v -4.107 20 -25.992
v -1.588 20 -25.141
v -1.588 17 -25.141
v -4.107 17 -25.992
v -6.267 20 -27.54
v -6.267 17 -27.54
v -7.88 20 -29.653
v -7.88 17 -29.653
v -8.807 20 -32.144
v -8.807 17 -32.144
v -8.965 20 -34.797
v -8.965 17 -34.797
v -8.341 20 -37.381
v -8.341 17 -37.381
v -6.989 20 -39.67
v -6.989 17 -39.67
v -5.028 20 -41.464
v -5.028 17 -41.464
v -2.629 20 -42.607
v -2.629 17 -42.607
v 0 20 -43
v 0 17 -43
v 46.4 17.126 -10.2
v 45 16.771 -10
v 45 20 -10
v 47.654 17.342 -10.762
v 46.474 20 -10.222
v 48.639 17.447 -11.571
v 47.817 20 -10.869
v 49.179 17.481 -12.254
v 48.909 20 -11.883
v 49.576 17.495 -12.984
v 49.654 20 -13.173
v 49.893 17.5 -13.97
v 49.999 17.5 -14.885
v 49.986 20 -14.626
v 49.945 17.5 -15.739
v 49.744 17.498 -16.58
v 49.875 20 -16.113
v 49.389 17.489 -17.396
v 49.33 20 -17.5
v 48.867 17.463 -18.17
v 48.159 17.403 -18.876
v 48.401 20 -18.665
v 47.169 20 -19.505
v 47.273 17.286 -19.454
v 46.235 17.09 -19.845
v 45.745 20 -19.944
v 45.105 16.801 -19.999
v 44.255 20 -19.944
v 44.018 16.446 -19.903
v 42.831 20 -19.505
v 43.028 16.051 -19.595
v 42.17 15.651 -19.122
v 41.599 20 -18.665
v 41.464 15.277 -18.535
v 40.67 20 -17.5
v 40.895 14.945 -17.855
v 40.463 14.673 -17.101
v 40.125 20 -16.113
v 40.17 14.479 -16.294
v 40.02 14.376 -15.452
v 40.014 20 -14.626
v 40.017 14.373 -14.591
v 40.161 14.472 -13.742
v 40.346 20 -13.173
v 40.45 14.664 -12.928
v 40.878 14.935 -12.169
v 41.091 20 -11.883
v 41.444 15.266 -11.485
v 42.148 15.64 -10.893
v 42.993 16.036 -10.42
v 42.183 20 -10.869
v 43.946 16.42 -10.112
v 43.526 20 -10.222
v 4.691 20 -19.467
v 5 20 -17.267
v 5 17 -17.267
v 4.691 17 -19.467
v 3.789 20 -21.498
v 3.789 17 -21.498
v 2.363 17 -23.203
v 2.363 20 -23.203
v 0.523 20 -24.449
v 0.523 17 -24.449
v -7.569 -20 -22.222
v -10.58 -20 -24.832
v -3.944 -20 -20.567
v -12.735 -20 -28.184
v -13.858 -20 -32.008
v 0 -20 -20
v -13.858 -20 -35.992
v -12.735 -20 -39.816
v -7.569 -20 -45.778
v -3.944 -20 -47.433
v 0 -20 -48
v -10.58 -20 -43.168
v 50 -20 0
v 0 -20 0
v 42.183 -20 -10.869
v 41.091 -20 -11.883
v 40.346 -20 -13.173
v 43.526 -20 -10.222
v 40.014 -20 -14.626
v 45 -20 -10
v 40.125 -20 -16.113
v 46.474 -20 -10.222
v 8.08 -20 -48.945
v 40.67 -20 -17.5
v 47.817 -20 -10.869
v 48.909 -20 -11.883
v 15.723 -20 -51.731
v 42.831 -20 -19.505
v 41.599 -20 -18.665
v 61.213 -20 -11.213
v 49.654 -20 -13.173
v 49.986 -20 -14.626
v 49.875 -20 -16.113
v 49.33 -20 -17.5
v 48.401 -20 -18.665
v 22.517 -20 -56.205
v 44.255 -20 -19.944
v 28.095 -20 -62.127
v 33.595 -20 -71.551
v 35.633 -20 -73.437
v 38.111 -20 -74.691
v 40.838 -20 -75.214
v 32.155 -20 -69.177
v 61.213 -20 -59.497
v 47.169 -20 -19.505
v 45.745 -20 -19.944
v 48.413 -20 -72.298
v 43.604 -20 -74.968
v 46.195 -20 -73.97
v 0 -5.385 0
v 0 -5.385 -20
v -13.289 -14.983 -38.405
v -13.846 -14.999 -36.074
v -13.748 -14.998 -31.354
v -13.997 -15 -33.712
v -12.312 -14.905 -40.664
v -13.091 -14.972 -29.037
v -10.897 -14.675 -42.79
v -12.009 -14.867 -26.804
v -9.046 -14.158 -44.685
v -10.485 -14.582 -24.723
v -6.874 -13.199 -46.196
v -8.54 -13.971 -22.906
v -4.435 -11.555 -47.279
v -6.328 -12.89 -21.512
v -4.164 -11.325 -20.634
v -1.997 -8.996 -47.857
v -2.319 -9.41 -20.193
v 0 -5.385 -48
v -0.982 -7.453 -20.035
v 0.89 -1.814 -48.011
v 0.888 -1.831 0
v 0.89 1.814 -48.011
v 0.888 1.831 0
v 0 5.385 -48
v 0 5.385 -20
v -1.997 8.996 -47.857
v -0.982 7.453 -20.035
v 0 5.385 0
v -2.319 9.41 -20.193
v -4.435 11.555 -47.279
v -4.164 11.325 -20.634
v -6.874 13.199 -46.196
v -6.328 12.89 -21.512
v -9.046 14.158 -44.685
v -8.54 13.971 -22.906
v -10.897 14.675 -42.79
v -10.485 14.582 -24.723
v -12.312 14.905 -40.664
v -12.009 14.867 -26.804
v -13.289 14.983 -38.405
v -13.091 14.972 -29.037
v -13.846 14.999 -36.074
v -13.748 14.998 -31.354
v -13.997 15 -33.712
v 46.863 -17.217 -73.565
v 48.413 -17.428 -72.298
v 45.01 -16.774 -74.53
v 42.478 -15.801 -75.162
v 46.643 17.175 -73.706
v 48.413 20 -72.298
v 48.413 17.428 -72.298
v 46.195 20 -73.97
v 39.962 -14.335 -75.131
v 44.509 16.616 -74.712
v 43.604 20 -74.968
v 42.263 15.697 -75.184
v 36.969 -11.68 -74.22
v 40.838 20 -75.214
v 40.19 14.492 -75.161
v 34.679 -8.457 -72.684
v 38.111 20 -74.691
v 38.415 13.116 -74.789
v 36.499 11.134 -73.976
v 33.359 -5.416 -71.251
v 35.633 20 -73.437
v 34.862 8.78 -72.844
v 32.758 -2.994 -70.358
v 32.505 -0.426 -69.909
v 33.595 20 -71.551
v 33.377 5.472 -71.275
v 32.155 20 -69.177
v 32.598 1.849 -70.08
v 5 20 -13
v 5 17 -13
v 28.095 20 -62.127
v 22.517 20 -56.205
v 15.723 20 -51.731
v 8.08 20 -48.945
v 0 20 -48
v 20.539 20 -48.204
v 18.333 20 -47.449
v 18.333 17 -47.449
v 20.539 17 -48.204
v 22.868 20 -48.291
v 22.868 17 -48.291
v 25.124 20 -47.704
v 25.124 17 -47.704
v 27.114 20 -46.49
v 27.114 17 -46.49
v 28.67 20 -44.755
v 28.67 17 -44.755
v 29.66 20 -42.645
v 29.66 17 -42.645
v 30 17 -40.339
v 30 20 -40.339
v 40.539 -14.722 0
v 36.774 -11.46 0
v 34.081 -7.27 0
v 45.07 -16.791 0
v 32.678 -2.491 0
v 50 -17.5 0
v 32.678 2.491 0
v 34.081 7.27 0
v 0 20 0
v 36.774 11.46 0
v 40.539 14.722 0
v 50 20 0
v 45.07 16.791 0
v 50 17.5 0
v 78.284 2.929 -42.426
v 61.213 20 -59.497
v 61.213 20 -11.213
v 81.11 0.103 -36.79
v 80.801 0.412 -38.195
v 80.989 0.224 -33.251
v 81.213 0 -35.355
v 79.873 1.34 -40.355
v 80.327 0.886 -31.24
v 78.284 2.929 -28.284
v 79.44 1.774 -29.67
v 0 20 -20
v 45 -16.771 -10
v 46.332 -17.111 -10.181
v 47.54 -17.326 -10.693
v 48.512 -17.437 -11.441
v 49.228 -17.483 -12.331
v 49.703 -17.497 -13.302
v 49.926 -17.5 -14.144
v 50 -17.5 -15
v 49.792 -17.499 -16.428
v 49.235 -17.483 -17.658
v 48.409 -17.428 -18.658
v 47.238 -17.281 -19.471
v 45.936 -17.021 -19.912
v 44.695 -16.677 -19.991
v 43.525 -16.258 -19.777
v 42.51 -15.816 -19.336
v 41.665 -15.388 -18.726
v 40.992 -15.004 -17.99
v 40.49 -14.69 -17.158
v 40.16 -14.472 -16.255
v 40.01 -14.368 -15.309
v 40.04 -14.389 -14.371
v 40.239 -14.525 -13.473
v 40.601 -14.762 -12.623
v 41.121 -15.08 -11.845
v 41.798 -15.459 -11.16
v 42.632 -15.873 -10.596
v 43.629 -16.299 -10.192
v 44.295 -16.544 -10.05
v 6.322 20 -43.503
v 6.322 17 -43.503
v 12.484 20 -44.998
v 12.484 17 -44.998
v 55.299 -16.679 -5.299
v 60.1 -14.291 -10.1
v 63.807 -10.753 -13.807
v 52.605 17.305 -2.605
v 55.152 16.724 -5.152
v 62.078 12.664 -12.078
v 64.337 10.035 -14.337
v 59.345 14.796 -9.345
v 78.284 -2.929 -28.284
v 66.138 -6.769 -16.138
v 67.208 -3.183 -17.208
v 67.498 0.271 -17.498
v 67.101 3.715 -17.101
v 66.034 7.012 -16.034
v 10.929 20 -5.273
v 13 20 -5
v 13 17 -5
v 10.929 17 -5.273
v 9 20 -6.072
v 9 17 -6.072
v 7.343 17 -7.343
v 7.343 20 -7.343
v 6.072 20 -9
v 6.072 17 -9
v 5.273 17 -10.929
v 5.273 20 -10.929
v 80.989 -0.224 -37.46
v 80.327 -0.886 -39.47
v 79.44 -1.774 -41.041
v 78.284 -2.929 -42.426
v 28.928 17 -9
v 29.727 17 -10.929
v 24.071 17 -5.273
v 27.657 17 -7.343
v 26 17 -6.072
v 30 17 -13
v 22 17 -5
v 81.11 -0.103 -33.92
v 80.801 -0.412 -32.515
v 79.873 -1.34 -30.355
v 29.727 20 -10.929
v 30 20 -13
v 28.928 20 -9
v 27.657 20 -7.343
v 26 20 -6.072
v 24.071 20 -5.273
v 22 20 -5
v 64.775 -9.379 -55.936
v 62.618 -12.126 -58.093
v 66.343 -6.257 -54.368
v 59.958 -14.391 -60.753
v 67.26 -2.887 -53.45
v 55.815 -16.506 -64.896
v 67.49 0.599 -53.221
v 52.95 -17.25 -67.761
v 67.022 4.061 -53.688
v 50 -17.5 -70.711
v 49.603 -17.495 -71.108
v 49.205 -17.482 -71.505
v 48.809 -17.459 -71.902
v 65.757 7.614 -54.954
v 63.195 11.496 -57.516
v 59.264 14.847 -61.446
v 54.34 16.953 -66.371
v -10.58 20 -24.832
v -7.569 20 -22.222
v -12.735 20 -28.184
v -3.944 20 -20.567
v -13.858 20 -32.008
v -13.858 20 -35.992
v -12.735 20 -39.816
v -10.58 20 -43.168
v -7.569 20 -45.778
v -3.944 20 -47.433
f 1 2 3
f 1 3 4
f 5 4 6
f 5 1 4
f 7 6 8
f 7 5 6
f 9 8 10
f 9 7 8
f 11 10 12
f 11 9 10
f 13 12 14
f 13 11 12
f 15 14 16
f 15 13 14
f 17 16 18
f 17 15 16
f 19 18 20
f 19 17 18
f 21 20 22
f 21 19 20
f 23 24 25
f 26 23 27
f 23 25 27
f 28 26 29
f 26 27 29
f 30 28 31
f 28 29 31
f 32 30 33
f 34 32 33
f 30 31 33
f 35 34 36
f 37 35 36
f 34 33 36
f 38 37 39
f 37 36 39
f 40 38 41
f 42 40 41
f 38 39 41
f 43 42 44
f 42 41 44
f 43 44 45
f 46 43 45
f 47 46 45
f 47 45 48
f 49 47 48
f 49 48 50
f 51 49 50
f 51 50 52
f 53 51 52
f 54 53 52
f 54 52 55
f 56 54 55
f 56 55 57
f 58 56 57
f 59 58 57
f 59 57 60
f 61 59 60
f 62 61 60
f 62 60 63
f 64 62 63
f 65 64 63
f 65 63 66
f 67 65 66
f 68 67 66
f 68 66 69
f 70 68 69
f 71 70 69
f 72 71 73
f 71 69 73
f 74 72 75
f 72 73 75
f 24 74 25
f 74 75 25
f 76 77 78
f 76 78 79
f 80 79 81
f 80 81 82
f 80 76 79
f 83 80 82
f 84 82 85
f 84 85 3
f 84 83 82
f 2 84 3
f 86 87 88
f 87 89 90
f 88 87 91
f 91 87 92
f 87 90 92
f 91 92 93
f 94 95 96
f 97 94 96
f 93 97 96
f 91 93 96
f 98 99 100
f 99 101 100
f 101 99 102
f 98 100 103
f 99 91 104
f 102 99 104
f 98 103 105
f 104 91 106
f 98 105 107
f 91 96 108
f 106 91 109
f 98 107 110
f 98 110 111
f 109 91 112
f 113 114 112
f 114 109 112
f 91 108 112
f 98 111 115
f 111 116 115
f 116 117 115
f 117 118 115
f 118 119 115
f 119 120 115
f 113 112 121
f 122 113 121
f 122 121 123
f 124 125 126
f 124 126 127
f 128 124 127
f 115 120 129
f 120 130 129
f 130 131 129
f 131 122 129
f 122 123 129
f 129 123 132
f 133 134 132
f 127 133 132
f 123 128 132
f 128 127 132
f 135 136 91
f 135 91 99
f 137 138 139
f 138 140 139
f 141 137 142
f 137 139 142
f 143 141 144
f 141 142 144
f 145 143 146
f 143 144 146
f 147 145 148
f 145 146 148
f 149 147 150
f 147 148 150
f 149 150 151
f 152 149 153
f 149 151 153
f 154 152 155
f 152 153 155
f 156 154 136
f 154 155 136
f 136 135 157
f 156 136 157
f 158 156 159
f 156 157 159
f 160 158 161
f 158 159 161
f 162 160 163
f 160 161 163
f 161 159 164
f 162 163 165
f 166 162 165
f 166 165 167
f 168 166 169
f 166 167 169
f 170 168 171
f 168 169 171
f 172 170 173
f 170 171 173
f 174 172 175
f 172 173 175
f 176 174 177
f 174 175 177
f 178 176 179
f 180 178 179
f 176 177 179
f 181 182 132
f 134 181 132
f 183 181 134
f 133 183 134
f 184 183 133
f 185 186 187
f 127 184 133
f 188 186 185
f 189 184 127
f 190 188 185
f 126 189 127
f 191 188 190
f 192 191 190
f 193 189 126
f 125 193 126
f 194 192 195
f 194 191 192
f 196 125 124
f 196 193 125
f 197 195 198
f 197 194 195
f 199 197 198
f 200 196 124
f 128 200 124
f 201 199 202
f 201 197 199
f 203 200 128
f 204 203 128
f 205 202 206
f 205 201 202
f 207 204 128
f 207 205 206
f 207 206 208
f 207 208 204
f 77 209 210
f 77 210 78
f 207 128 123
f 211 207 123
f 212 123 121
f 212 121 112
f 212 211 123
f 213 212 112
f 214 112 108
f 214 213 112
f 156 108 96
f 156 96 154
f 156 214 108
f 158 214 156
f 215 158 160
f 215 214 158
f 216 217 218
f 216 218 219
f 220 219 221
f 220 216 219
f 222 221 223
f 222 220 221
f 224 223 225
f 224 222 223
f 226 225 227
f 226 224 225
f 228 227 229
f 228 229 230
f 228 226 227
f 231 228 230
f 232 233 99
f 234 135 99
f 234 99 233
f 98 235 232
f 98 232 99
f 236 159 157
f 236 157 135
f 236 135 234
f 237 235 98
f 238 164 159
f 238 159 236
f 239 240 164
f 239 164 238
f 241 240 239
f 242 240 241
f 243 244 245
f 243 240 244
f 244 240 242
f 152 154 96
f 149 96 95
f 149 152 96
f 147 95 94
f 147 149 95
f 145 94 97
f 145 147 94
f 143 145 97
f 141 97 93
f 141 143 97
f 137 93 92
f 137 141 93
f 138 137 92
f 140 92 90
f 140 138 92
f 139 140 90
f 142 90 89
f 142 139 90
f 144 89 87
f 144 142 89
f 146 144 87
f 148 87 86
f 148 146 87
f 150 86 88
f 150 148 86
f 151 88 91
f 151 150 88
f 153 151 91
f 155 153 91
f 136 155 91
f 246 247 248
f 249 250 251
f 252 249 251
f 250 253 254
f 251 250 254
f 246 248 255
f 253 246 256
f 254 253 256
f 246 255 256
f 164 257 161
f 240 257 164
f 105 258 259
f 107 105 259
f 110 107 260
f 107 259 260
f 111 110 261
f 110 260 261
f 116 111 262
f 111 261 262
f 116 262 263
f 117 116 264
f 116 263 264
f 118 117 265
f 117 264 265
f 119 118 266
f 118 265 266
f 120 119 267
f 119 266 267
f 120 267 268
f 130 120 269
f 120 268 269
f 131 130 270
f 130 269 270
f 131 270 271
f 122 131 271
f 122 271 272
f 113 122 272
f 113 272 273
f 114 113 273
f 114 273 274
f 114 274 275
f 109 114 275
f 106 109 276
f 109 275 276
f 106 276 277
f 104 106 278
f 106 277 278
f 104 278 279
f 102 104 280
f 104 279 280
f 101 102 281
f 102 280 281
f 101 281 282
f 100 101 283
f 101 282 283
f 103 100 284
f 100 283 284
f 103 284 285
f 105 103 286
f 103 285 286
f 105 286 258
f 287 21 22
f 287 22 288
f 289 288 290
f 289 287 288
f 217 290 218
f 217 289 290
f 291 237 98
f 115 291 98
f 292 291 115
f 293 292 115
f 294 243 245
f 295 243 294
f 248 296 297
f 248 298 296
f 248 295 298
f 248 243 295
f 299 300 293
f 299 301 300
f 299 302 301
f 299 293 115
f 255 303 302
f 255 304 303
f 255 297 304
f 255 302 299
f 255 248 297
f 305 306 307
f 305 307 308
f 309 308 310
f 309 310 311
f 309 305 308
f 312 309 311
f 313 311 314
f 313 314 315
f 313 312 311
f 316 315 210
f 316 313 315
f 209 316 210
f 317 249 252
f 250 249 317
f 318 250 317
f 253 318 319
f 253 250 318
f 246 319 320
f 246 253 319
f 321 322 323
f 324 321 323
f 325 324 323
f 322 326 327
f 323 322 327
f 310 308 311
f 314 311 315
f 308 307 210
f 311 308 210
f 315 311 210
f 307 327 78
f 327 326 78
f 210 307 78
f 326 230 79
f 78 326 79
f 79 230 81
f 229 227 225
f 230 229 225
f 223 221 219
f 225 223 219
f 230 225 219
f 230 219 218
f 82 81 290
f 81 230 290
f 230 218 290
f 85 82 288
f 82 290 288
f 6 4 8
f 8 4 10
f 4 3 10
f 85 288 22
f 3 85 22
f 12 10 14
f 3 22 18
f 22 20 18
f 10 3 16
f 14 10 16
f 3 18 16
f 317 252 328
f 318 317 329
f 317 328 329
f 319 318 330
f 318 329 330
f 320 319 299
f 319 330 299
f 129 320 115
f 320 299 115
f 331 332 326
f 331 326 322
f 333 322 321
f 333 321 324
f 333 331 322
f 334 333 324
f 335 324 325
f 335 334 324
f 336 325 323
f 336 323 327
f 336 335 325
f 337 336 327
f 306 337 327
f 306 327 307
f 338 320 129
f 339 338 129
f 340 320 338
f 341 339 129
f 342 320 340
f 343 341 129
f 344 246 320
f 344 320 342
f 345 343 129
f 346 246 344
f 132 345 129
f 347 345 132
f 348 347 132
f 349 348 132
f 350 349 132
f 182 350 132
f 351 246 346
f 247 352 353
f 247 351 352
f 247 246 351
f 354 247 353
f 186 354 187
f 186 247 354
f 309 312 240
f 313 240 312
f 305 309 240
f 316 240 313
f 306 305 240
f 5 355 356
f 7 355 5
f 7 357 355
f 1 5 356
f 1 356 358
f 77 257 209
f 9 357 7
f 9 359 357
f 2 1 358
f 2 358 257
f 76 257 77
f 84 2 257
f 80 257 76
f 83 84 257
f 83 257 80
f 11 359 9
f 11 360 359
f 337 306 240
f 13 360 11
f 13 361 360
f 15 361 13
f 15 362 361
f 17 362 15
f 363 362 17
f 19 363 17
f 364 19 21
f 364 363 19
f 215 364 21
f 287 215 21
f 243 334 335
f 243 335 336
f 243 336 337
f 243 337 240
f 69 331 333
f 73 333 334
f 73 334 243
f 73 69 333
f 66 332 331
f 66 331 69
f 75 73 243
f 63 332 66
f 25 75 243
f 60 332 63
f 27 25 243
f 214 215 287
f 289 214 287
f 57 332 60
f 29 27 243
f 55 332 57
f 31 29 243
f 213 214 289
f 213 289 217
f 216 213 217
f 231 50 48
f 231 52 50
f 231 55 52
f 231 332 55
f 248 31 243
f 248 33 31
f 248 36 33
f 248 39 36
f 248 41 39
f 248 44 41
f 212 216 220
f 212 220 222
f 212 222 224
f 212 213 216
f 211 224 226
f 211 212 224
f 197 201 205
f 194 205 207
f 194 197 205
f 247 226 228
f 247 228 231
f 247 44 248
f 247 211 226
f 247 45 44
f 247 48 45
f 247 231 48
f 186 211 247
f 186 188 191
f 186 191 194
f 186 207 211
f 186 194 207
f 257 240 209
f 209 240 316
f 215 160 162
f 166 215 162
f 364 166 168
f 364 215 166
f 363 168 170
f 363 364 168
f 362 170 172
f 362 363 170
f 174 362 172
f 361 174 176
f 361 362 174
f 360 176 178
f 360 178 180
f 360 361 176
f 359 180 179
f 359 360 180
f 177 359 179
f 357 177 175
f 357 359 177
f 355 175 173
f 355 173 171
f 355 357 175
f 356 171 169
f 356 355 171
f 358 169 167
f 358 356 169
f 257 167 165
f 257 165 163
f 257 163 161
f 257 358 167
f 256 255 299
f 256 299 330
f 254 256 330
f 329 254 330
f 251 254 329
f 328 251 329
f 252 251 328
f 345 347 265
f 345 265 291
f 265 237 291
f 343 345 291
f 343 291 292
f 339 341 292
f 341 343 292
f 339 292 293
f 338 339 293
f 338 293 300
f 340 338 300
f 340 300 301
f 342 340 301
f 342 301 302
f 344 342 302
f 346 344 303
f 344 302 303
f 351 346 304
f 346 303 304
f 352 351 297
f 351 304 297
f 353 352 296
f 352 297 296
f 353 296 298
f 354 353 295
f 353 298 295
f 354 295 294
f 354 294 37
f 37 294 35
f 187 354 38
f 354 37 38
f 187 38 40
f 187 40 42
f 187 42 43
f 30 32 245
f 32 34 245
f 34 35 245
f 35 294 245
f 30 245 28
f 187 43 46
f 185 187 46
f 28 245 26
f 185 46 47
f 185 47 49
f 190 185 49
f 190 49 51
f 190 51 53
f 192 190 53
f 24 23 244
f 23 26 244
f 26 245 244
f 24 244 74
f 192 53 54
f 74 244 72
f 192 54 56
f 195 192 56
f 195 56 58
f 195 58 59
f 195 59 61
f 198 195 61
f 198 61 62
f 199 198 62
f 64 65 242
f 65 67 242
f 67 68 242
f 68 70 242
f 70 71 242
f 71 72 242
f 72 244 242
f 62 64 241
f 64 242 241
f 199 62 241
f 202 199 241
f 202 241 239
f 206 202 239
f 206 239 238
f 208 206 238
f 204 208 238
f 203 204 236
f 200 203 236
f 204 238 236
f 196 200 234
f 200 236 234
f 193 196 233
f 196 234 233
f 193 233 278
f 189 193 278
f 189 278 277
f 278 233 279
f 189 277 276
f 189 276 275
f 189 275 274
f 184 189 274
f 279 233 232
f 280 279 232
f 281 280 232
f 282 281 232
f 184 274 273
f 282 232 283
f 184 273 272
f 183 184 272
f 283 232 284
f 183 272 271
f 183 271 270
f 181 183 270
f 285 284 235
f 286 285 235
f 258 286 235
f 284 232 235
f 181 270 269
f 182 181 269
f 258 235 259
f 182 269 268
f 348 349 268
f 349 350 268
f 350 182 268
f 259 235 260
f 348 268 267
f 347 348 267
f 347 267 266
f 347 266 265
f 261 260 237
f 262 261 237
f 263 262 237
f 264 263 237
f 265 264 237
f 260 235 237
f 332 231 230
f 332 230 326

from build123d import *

# Parameters (mm, degrees)
BOSS_EXTRU_1_DEPTH      = 20
ENL_V_MAT_EXTRU_1_DEPTH = 3
ESQUISSE3_R             = 17.5
ESQUISSE3_R_2           = 15
ENL_V_MAT_EXTRU_2_DEPTH = 113.493063486
ESQUISSE5_R             = 5
ENL_V_MAT_EXTRU_3_DEPTH = 118.705944436
ENL_V_MAT_EXTRU_4_DEPTH = 113.493063571


with BuildPart() as part:
    # Esquisse1 → Boss.-Extru.1 (new, symmetric)
    with BuildSketch(Plane(origin=(0, 0, 0), x_dir=(1, 0, 0), z_dir=(0, 1, 0))):
        with BuildLine():
            Line((0, 0), (50, 0))
            Line((50, 0), (78.284271247, 28.284271247))
            ThreePointArc((78.284271247, 28.284271247), (81.213203436, 35.355339059), (78.284271247, 42.426406871))
            Line((78.284271247, 42.426406871), (48.412587767, 72.298090352))
            ThreePointArc((48.412587767, 72.298090352), (39.455979063, 75.047650602), (32.154515521, 69.176573087))
            ThreePointArc((32.154515521, 69.176573087), (19.250715026, 53.76970799), (0, 48))
            ThreePointArc((0, 48), (-14, 34), (0, 20))
            Line((0, 20), (0, 0))
        make_face()
    extrude(amount=BOSS_EXTRU_1_DEPTH, both=True)

    # Esquisse2 → Enlèv. mat.-Extru.1 (cut)
    with BuildSketch(Plane(origin=(0, 20, 0), x_dir=(1, 0, 0), z_dir=(0, 1, 0))):
        with BuildLine():
            Line((30, 40.338541985), (30, 13))
            ThreePointArc((30, 13), (27.656854249, 7.343145751), (22, 5))
            Line((22, 5), (13, 5))
            ThreePointArc((13, 5), (7.343145751, 7.343145751), (5, 13))
            Line((5, 13), (5, 17.266799469))
            ThreePointArc((5, 17.266799469), (3.135719911, 22.400311053), (-1.588235294, 25.141246778))
            ThreePointArc((-1.588235294, 25.141246778), (-8.964618759, 34.797251843), (0, 43))
            ThreePointArc((0, 43), (9.432693133, 44.128103979), (18.333333333, 47.448784987))
            ThreePointArc((18.333333333, 47.448784987), (26.163331999, 47.169842495), (30, 40.338541985))
        make_face()
    extrude(amount=-ENL_V_MAT_EXTRU_1_DEPTH, mode=Mode.SUBTRACT)

    # Esquisse3 → Enlèv. mat.-Extru.2 (cut, through all)
    with BuildSketch(Plane.XY):
        with Locations(Location((50, 0, 0), (0, 0, 270))):
            Circle(ESQUISSE3_R)
        with Locations((-14, 0)):
            Circle(ESQUISSE3_R_2)
    extrude(amount=-ENL_V_MAT_EXTRU_2_DEPTH, mode=Mode.SUBTRACT)

    # Esquisse5 → Enlèv. mat.-Extru.3 (cut, through all)
    with BuildSketch(Plane(origin=(0, 20, 0), x_dir=(1, 0, 0), z_dir=(0, 1, 0))):
        with Locations(Location((45, 15, 0), (0, 0, 270))):
            Circle(ESQUISSE5_R)
    extrude(amount=-ENL_V_MAT_EXTRU_3_DEPTH, mode=Mode.SUBTRACT)

    # Esquisse6 → Enlèv. mat.-Extru.4 (cut, through all)
    with BuildSketch(Plane.XY):
        Polygon((81.213203436, 0), (81.213203436, 20), (61.213203436, 20), align=None)
        Polygon((81.213203436, -20), (81.213203436, 0), (61.213203436, -20), align=None)
    extrude(amount=-ENL_V_MAT_EXTRU_4_DEPTH, mode=Mode.SUBTRACT)


solid = part.part
